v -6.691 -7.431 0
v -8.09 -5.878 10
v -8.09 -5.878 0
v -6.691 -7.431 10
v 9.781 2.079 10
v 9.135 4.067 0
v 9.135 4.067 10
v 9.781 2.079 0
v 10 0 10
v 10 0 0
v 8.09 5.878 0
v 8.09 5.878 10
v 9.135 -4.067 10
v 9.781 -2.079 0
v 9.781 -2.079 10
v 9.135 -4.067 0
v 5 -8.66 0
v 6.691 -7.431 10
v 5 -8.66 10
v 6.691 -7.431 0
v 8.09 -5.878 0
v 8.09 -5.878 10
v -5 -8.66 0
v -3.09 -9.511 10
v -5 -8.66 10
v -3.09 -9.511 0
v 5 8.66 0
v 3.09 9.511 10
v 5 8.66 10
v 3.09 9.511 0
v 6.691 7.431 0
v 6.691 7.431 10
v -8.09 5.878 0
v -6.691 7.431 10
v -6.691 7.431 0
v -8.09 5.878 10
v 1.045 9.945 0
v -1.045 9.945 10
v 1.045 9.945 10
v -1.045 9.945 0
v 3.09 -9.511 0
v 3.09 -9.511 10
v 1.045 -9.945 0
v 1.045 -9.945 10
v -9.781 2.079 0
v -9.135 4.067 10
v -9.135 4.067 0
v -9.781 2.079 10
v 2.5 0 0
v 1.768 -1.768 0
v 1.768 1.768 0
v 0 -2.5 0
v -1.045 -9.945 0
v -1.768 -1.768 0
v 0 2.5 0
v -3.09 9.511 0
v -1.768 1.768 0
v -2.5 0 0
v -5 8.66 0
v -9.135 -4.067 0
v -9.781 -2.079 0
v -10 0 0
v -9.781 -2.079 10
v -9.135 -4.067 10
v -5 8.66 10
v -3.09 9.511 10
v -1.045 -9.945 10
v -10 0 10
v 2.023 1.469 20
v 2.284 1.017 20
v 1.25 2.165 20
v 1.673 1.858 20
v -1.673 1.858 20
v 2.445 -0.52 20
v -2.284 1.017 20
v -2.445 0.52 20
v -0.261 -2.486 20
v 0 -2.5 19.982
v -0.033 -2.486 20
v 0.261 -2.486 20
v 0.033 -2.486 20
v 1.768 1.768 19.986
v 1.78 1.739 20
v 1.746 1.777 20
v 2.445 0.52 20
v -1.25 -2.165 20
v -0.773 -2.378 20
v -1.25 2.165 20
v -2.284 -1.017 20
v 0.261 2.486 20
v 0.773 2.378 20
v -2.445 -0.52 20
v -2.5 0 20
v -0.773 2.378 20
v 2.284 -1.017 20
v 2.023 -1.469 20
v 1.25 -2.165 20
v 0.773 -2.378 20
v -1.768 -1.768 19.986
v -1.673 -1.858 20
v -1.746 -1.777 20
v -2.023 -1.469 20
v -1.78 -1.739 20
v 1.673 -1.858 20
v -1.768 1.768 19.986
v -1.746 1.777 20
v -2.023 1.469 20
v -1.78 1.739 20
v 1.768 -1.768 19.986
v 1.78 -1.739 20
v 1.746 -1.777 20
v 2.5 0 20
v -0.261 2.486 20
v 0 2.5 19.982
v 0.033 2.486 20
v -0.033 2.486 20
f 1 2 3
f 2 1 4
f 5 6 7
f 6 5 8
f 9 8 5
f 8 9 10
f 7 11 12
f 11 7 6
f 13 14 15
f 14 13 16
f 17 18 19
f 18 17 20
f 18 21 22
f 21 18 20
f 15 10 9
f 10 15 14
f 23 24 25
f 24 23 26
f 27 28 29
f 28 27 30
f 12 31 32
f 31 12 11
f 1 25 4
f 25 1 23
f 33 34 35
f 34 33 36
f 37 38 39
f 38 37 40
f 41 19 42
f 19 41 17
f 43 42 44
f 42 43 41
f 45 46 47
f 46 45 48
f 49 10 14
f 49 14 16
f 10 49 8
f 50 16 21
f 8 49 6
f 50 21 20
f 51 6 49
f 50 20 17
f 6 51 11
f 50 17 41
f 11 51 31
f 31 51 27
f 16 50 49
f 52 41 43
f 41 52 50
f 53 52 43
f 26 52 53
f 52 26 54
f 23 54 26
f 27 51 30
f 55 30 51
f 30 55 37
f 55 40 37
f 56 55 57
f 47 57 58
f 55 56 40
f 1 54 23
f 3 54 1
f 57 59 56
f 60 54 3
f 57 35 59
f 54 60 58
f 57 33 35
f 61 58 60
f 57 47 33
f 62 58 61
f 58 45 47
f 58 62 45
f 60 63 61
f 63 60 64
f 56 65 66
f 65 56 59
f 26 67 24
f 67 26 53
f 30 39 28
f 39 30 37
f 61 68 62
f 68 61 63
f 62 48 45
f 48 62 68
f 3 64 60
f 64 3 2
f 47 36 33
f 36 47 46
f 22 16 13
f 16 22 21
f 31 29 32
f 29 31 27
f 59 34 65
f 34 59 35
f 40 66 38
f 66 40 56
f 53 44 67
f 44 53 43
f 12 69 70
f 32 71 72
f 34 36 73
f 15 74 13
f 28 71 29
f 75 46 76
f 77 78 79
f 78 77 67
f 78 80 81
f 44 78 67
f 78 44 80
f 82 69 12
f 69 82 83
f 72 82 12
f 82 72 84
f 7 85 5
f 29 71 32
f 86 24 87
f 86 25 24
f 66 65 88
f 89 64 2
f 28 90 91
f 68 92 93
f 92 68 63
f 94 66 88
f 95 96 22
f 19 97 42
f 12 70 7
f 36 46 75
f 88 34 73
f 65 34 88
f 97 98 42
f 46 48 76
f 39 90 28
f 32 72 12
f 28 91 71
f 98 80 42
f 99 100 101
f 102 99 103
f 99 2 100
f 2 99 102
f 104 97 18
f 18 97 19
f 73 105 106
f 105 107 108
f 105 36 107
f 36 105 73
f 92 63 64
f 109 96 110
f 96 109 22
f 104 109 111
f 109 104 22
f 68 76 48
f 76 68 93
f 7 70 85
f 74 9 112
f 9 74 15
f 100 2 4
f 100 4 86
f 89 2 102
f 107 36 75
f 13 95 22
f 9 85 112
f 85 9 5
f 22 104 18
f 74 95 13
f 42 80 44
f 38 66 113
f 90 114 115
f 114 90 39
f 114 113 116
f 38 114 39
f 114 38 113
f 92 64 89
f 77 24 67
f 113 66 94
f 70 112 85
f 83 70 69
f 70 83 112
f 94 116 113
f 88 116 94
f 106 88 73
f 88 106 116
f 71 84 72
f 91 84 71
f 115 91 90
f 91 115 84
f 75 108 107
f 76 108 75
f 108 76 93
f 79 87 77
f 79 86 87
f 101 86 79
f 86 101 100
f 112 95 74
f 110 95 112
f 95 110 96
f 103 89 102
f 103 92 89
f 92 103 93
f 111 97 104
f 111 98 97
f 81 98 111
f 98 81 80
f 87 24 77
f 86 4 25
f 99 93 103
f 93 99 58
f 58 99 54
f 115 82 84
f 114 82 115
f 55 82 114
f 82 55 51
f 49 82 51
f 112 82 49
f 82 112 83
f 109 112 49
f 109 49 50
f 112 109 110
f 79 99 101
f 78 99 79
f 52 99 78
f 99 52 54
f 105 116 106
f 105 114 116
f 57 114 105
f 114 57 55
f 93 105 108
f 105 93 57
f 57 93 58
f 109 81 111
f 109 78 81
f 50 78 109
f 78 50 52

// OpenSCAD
// file: physical_dimensions.scad
//Physically bound settings.
printing_play = 0.2; //Horizontal error in 3D printing.
printing_overhang = 50; //Maximum overhang angle. 90 is perfect bridging. 0 is no overhang possible.
movement_play = 0.2; //Play to leave if stuff has to move past each other.

m3_bolt_radius = 1.5;
m3_nut_radius = 5.5 / 2;
m3_nut_height = 2.4;

ball_radius = 15; //Standard pinball size (7/6 inch).
ball_slit = ball_radius * 2 + movement_play * 2 + 4; //Allow 4mm extra space to make the ball fall through faster.

cabinet_thickness = 18; //1.8cm wooden planks.
cabinet_plank_width = 196; //Planks are this wide.

flipper_solenoid_width = 13;
flipper_solenoid_height = 15;
flipper_solenoid_length = 30;
flipper_solenoid_pin_radius = 2;
flipper_solenoid_pin_retracted = 8.5; //Length when retracted.
flipper_solenoid_pin_expansion = 10; //Stroke length.
flipper_solenoid_pinhole_position = 2.5; //Distance from centre of hole to tip of pin.
flipper_solenoid_pinhole_radius = m3_bolt_radius;
flipper_solenoid_pingap_thickness = 1.6;
flipper_solenoid_pingap_depth = 7;
flipper_solenoid_screw_radius = m3_bolt_radius;
flipper_solenoid_screw1_position = 8; //Distance from front.
flipper_solenoid_screw2_position = 15 + flipper_solenoid_screw1_position;
flipper_solenoid_screw_depth = 4; //Unknown.

hexkey_radius = 2; //Radius of circumscribed circle around hex key.
hexkey_short_length = 30; //Length of short end.//TODO: How long is this?
hexkey_long_length = 100; //TODO: How long is this?
hexkey_turn_radius = 10; //TODO: Also unknown.

lane_width = 50;

matrix_size = [320, 160]; //Size of LED matrix.

playfield_width = 610;
playfield_height = 1220;
playfield_slope = 6; //Degrees.
playfield_thickness = 18;

plunger_rod_length = 100;
plunger_rod_radius = 2.5;
plunger_extension = 5; //How far the rod protrudes into the ball lane.
plunger_handle_overlap = 10; //How far the rod protrudes in the handle.
plunger_handle_radius = 20;
plunger_handle_height = 40;
plunger_spring_compression = 30; //How far the spring can compress.
plunger_spring_stop_radius = 10; //Must be larger than the radius of the spring.
plunger_spring_stop_length = 10;
plunger_spring_stop_cone_length = 10;

solenoid_width = 13;
solenoid_height = 15;
solenoid_length = 30;
solenoid_pin_radius = 2;
solenoid_pin_retracted = 8.5; //Length when retracted.
solenoid_pin_expansion = 10; //Stroke length.
solenoid_pinhole_position = 2.5; //Distance from centre of hole to tip of pin.
solenoid_pinhole_radius = m3_bolt_radius;
solenoid_pingap_thickness = 1.6;
solenoid_pingap_depth = 7;
solenoid_screw_radius = m3_bolt_radius;
solenoid_screw1_position = 8; //Distance from front.
solenoid_screw2_position = 15 + solenoid_screw1_position;
solenoid_screw_depth = 4; //Unknown.

space_bottom = 100;
space_top = 100;
space_top_back = 200;

spring_end_thickness = 2; //How thick the attachment part of the spring is.
spring_radius = 4; //Radius of the coil of the spring.
// main file
//Plug that compresses the spring on the plunger.

include <physical_dimensions.scad>

module plunger_spring_stop() {
	difference() {
		union() {
			cylinder(r=plunger_spring_stop_radius, h=plunger_spring_stop_length);
			translate([0, 0, plunger_spring_stop_length]) {
				cylinder(r1=plunger_spring_stop_radius, r2=plunger_rod_radius, h=plunger_spring_stop_cone_length);
			}
		}
		cylinder(r=plunger_rod_radius, h=plunger_spring_stop_length + plunger_spring_stop_cone_length);
	}
}

plunger_spring_stop();
